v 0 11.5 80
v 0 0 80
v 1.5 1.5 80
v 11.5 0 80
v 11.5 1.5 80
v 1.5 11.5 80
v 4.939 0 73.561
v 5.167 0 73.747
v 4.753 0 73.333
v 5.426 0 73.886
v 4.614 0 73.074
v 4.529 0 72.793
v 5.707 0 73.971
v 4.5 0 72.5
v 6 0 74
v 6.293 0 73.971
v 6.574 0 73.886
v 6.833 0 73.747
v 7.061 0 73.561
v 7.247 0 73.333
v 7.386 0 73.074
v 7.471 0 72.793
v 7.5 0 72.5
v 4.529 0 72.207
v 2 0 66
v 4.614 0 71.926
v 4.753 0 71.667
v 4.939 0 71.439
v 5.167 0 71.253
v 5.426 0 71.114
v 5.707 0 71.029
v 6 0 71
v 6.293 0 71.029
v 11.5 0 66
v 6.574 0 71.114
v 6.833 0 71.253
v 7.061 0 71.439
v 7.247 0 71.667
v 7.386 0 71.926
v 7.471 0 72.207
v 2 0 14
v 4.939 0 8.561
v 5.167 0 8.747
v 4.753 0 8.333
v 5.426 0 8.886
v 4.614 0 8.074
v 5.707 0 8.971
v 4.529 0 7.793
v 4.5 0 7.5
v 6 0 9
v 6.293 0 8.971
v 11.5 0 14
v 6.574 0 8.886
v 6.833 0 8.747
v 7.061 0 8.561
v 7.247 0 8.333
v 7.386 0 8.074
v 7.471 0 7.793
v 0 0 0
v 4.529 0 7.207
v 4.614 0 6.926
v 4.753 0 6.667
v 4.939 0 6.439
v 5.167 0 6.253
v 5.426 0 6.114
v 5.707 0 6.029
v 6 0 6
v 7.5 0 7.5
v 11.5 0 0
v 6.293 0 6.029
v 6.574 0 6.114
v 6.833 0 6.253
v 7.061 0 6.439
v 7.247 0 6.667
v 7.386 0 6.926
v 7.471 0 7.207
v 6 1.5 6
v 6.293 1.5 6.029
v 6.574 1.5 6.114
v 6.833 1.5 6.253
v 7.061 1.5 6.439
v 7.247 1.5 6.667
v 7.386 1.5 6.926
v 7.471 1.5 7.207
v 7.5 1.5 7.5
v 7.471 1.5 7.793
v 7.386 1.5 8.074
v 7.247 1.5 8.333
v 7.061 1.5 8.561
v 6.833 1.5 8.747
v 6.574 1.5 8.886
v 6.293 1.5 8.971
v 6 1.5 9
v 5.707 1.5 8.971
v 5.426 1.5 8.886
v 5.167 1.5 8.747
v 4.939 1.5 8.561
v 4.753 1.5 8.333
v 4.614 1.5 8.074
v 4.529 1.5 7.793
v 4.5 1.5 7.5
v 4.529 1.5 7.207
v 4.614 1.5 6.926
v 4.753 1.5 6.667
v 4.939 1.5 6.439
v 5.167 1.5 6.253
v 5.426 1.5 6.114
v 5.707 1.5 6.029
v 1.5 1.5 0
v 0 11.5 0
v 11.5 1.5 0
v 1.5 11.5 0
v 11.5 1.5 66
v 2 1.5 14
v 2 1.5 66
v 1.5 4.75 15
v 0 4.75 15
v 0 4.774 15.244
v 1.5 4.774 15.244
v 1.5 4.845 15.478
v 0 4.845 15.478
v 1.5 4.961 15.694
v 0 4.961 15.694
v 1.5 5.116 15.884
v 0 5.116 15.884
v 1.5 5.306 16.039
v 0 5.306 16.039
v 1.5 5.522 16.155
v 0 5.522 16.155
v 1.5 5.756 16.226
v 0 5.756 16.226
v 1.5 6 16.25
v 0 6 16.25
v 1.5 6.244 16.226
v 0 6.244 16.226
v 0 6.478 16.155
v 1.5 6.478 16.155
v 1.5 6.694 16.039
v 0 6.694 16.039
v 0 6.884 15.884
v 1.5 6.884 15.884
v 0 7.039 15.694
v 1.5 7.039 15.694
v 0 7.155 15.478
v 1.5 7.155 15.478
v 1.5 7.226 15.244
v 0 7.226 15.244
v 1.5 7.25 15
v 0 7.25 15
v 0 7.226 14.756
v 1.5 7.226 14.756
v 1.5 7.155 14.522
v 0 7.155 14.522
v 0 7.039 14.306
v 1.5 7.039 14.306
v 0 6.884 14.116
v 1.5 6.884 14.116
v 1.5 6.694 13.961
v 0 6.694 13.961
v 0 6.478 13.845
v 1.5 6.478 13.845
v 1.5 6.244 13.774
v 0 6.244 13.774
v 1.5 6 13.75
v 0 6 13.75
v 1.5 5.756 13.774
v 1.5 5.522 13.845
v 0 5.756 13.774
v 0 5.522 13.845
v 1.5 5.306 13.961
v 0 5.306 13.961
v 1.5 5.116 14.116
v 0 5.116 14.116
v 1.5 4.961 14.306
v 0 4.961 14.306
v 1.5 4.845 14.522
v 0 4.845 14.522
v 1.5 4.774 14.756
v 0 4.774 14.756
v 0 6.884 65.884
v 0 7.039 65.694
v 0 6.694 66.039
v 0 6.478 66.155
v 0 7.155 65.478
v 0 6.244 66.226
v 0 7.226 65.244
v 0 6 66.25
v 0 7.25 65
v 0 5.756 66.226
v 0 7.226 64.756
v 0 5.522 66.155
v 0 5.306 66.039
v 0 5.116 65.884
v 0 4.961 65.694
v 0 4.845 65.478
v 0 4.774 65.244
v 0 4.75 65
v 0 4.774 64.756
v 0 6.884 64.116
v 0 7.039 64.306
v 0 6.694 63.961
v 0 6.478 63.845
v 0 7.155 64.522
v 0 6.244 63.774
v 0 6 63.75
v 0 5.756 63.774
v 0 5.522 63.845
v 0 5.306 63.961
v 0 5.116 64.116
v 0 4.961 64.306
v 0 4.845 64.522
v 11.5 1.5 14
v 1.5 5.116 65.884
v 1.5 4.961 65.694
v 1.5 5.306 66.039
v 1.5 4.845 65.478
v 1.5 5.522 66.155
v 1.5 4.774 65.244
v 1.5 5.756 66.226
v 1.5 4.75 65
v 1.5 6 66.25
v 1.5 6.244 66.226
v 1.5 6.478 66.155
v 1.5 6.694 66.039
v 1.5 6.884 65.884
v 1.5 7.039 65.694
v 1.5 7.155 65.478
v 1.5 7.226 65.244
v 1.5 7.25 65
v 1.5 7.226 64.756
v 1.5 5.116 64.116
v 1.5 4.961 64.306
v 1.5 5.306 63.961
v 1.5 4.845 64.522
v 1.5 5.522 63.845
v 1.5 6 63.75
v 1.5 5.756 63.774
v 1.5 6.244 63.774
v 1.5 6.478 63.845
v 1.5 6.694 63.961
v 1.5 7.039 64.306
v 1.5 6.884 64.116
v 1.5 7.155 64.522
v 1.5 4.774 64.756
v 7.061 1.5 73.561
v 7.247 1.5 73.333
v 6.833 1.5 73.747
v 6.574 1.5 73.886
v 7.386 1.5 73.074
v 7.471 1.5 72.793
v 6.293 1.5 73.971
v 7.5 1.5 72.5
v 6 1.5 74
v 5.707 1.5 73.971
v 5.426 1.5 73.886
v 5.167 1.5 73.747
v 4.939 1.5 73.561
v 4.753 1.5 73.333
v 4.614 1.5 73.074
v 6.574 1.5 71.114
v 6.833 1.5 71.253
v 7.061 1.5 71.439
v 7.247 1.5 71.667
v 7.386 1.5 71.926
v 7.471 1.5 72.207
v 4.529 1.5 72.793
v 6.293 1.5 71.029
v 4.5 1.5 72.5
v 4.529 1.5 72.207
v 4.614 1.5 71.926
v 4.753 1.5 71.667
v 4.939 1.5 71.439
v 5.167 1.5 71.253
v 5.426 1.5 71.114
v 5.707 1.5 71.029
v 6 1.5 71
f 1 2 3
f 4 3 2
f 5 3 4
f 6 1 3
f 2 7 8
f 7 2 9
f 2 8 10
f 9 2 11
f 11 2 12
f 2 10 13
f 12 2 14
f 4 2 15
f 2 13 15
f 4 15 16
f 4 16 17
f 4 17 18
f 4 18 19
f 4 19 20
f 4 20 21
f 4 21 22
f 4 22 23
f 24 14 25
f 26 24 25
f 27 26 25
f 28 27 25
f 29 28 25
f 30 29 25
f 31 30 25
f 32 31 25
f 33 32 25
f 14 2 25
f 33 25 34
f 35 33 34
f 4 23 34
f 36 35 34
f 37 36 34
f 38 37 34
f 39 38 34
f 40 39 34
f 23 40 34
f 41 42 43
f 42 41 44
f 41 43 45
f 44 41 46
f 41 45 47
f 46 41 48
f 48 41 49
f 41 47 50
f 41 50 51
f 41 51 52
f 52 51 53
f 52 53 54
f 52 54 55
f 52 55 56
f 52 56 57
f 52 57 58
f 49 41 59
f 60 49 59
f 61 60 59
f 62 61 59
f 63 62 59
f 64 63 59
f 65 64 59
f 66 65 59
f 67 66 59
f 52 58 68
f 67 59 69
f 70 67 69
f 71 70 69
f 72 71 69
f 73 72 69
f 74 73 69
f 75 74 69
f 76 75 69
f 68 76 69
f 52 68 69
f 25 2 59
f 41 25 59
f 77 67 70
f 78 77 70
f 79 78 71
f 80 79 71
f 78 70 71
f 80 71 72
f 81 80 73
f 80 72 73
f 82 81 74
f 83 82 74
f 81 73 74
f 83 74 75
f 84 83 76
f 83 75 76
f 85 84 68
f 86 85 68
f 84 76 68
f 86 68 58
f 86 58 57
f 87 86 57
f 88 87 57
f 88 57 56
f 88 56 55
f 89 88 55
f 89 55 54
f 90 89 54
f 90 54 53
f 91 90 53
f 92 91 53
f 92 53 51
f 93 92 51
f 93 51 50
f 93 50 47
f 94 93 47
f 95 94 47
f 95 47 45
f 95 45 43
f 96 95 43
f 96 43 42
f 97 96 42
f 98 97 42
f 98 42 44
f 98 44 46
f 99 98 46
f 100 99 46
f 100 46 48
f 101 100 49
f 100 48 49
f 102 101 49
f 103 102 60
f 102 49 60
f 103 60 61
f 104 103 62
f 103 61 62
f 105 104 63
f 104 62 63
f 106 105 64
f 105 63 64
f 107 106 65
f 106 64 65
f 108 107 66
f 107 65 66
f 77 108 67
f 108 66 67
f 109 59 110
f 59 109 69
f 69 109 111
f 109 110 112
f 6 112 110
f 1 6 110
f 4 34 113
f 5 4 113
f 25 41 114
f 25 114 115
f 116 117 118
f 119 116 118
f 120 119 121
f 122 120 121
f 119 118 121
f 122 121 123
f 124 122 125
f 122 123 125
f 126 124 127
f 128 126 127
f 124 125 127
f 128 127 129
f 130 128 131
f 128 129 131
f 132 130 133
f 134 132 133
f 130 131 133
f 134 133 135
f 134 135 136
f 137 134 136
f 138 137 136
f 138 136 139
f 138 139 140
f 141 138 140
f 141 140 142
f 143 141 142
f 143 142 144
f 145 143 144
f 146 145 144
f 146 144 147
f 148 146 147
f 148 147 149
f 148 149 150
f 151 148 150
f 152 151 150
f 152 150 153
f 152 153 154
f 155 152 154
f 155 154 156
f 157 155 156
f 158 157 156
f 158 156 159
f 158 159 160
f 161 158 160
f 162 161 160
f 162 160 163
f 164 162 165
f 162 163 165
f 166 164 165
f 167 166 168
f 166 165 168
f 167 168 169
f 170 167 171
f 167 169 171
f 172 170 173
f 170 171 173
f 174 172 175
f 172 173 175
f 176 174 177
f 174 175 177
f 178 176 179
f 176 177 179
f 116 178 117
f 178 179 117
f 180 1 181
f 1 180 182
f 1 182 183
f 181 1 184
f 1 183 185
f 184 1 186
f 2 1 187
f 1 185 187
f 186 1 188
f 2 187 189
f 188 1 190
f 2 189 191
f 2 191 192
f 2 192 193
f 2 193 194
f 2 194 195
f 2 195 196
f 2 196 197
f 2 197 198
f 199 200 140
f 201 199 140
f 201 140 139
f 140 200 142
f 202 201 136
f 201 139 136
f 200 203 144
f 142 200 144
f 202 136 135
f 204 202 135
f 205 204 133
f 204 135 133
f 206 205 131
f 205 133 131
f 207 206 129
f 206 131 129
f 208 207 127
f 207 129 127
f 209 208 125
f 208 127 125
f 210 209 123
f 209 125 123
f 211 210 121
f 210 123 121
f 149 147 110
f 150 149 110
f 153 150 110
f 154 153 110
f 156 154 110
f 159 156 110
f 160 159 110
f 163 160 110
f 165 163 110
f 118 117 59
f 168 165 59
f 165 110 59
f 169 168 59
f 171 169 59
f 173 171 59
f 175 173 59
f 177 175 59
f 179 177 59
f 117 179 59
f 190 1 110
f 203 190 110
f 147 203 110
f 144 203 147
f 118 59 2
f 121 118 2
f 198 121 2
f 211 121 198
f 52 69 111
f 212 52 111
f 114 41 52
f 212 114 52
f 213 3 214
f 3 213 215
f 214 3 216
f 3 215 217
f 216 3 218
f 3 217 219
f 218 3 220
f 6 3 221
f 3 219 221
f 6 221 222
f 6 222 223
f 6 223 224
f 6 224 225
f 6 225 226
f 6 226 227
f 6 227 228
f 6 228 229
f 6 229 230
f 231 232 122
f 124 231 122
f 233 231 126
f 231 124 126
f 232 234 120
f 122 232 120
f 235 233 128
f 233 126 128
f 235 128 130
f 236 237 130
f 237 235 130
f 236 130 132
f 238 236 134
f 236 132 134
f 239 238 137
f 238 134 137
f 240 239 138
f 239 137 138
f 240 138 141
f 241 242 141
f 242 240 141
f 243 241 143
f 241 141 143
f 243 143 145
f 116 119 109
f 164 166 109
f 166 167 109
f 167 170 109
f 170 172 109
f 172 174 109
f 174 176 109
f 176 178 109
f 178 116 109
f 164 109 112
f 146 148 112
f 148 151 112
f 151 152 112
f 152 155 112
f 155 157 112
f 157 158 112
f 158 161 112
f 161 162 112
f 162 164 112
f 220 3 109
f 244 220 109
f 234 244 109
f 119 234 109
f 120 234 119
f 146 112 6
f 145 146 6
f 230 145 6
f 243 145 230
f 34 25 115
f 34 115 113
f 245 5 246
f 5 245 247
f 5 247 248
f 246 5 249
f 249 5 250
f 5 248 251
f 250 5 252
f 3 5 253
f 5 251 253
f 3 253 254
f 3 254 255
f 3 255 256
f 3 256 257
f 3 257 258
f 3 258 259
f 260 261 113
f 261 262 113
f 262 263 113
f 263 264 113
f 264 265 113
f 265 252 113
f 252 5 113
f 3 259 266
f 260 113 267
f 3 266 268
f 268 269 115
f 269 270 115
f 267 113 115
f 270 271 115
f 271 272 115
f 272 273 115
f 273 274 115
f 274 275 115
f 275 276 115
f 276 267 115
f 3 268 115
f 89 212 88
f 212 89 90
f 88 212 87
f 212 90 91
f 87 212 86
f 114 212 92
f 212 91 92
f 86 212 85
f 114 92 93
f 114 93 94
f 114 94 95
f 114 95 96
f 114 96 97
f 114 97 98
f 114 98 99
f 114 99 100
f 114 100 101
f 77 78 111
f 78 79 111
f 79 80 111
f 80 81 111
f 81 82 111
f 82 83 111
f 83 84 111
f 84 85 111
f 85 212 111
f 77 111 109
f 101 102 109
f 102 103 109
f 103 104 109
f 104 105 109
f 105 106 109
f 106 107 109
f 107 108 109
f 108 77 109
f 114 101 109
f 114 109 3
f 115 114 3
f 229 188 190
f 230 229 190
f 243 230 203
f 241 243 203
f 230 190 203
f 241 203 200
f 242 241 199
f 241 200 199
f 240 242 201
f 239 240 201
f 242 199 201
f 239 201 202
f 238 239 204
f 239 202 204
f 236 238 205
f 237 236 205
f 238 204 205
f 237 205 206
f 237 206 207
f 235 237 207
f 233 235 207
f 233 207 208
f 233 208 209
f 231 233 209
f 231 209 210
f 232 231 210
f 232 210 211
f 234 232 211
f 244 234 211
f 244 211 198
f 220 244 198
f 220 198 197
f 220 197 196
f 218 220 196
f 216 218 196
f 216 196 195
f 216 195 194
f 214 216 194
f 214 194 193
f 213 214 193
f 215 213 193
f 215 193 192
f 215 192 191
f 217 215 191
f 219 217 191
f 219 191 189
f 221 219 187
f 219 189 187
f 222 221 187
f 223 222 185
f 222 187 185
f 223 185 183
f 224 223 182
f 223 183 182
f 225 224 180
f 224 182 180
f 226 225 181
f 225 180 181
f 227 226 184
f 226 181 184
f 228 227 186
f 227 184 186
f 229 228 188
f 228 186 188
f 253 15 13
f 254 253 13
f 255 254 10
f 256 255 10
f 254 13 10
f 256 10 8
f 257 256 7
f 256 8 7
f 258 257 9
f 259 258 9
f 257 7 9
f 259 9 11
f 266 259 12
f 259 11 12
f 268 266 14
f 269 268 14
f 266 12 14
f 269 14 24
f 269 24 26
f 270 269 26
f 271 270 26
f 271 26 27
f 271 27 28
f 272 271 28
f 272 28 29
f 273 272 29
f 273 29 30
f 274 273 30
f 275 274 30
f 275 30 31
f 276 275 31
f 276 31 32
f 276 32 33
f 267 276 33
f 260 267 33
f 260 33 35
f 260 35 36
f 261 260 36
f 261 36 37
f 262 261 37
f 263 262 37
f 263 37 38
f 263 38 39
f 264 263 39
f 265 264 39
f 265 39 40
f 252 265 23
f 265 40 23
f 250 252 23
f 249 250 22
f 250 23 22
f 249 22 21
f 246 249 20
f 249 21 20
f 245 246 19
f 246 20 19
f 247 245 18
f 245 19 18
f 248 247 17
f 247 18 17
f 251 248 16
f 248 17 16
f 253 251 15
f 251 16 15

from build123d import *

# Parameters (mm, degrees)
EXTRU_MINCE1_DEPTH      = 80
ESQUISSE2_R             = 1.25
ENL_V_MAT_EXTRU_1_DEPTH = 10
ESQUISSE3_R             = 1.5
ESQUISSE3_W             = 9.5
ESQUISSE3_H             = 52
ENL_V_MAT_EXTRU_2_DEPTH = 10


with BuildPart() as part:
    # Esquisse1 → Extru.-Mince1 (new body)
    with BuildSketch(Plane.XY):
        Polygon((0, 11.5), (0, 0), (11.5, 0), (11.5, 1.5), (1.5, 1.5), (1.5, 11.5), align=None)
    extrude(amount=EXTRU_MINCE1_DEPTH)

    # Esquisse2 → Enlèv. mat.-Extru.1 (cut)
    with BuildSketch(Plane.ZY):
        with Locations(Location((15, 6, 0), (0, 0, 270))):
            Circle(ESQUISSE2_R)
        with Locations(Location((65, 6, 0), (0, 0, 90))):
            Circle(ESQUISSE2_R)
    extrude(amount=-ENL_V_MAT_EXTRU_1_DEPTH, mode=Mode.SUBTRACT)

    # Esquisse3 → Enlèv. mat.-Extru.2 (cut)
    with BuildSketch(Plane.XZ):
        with Locations(Location((6, 7.5, 0), (0, 0, 270))):
            Circle(ESQUISSE3_R)
        with Locations(Location((6, 72.5, 0), (0, 0, 90))):
            Circle(ESQUISSE3_R)
        with Locations((6.75, 40)):
            Rectangle(ESQUISSE3_W, ESQUISSE3_H)
    extrude(amount=-ENL_V_MAT_EXTRU_2_DEPTH, mode=Mode.SUBTRACT)


solid = part.part
